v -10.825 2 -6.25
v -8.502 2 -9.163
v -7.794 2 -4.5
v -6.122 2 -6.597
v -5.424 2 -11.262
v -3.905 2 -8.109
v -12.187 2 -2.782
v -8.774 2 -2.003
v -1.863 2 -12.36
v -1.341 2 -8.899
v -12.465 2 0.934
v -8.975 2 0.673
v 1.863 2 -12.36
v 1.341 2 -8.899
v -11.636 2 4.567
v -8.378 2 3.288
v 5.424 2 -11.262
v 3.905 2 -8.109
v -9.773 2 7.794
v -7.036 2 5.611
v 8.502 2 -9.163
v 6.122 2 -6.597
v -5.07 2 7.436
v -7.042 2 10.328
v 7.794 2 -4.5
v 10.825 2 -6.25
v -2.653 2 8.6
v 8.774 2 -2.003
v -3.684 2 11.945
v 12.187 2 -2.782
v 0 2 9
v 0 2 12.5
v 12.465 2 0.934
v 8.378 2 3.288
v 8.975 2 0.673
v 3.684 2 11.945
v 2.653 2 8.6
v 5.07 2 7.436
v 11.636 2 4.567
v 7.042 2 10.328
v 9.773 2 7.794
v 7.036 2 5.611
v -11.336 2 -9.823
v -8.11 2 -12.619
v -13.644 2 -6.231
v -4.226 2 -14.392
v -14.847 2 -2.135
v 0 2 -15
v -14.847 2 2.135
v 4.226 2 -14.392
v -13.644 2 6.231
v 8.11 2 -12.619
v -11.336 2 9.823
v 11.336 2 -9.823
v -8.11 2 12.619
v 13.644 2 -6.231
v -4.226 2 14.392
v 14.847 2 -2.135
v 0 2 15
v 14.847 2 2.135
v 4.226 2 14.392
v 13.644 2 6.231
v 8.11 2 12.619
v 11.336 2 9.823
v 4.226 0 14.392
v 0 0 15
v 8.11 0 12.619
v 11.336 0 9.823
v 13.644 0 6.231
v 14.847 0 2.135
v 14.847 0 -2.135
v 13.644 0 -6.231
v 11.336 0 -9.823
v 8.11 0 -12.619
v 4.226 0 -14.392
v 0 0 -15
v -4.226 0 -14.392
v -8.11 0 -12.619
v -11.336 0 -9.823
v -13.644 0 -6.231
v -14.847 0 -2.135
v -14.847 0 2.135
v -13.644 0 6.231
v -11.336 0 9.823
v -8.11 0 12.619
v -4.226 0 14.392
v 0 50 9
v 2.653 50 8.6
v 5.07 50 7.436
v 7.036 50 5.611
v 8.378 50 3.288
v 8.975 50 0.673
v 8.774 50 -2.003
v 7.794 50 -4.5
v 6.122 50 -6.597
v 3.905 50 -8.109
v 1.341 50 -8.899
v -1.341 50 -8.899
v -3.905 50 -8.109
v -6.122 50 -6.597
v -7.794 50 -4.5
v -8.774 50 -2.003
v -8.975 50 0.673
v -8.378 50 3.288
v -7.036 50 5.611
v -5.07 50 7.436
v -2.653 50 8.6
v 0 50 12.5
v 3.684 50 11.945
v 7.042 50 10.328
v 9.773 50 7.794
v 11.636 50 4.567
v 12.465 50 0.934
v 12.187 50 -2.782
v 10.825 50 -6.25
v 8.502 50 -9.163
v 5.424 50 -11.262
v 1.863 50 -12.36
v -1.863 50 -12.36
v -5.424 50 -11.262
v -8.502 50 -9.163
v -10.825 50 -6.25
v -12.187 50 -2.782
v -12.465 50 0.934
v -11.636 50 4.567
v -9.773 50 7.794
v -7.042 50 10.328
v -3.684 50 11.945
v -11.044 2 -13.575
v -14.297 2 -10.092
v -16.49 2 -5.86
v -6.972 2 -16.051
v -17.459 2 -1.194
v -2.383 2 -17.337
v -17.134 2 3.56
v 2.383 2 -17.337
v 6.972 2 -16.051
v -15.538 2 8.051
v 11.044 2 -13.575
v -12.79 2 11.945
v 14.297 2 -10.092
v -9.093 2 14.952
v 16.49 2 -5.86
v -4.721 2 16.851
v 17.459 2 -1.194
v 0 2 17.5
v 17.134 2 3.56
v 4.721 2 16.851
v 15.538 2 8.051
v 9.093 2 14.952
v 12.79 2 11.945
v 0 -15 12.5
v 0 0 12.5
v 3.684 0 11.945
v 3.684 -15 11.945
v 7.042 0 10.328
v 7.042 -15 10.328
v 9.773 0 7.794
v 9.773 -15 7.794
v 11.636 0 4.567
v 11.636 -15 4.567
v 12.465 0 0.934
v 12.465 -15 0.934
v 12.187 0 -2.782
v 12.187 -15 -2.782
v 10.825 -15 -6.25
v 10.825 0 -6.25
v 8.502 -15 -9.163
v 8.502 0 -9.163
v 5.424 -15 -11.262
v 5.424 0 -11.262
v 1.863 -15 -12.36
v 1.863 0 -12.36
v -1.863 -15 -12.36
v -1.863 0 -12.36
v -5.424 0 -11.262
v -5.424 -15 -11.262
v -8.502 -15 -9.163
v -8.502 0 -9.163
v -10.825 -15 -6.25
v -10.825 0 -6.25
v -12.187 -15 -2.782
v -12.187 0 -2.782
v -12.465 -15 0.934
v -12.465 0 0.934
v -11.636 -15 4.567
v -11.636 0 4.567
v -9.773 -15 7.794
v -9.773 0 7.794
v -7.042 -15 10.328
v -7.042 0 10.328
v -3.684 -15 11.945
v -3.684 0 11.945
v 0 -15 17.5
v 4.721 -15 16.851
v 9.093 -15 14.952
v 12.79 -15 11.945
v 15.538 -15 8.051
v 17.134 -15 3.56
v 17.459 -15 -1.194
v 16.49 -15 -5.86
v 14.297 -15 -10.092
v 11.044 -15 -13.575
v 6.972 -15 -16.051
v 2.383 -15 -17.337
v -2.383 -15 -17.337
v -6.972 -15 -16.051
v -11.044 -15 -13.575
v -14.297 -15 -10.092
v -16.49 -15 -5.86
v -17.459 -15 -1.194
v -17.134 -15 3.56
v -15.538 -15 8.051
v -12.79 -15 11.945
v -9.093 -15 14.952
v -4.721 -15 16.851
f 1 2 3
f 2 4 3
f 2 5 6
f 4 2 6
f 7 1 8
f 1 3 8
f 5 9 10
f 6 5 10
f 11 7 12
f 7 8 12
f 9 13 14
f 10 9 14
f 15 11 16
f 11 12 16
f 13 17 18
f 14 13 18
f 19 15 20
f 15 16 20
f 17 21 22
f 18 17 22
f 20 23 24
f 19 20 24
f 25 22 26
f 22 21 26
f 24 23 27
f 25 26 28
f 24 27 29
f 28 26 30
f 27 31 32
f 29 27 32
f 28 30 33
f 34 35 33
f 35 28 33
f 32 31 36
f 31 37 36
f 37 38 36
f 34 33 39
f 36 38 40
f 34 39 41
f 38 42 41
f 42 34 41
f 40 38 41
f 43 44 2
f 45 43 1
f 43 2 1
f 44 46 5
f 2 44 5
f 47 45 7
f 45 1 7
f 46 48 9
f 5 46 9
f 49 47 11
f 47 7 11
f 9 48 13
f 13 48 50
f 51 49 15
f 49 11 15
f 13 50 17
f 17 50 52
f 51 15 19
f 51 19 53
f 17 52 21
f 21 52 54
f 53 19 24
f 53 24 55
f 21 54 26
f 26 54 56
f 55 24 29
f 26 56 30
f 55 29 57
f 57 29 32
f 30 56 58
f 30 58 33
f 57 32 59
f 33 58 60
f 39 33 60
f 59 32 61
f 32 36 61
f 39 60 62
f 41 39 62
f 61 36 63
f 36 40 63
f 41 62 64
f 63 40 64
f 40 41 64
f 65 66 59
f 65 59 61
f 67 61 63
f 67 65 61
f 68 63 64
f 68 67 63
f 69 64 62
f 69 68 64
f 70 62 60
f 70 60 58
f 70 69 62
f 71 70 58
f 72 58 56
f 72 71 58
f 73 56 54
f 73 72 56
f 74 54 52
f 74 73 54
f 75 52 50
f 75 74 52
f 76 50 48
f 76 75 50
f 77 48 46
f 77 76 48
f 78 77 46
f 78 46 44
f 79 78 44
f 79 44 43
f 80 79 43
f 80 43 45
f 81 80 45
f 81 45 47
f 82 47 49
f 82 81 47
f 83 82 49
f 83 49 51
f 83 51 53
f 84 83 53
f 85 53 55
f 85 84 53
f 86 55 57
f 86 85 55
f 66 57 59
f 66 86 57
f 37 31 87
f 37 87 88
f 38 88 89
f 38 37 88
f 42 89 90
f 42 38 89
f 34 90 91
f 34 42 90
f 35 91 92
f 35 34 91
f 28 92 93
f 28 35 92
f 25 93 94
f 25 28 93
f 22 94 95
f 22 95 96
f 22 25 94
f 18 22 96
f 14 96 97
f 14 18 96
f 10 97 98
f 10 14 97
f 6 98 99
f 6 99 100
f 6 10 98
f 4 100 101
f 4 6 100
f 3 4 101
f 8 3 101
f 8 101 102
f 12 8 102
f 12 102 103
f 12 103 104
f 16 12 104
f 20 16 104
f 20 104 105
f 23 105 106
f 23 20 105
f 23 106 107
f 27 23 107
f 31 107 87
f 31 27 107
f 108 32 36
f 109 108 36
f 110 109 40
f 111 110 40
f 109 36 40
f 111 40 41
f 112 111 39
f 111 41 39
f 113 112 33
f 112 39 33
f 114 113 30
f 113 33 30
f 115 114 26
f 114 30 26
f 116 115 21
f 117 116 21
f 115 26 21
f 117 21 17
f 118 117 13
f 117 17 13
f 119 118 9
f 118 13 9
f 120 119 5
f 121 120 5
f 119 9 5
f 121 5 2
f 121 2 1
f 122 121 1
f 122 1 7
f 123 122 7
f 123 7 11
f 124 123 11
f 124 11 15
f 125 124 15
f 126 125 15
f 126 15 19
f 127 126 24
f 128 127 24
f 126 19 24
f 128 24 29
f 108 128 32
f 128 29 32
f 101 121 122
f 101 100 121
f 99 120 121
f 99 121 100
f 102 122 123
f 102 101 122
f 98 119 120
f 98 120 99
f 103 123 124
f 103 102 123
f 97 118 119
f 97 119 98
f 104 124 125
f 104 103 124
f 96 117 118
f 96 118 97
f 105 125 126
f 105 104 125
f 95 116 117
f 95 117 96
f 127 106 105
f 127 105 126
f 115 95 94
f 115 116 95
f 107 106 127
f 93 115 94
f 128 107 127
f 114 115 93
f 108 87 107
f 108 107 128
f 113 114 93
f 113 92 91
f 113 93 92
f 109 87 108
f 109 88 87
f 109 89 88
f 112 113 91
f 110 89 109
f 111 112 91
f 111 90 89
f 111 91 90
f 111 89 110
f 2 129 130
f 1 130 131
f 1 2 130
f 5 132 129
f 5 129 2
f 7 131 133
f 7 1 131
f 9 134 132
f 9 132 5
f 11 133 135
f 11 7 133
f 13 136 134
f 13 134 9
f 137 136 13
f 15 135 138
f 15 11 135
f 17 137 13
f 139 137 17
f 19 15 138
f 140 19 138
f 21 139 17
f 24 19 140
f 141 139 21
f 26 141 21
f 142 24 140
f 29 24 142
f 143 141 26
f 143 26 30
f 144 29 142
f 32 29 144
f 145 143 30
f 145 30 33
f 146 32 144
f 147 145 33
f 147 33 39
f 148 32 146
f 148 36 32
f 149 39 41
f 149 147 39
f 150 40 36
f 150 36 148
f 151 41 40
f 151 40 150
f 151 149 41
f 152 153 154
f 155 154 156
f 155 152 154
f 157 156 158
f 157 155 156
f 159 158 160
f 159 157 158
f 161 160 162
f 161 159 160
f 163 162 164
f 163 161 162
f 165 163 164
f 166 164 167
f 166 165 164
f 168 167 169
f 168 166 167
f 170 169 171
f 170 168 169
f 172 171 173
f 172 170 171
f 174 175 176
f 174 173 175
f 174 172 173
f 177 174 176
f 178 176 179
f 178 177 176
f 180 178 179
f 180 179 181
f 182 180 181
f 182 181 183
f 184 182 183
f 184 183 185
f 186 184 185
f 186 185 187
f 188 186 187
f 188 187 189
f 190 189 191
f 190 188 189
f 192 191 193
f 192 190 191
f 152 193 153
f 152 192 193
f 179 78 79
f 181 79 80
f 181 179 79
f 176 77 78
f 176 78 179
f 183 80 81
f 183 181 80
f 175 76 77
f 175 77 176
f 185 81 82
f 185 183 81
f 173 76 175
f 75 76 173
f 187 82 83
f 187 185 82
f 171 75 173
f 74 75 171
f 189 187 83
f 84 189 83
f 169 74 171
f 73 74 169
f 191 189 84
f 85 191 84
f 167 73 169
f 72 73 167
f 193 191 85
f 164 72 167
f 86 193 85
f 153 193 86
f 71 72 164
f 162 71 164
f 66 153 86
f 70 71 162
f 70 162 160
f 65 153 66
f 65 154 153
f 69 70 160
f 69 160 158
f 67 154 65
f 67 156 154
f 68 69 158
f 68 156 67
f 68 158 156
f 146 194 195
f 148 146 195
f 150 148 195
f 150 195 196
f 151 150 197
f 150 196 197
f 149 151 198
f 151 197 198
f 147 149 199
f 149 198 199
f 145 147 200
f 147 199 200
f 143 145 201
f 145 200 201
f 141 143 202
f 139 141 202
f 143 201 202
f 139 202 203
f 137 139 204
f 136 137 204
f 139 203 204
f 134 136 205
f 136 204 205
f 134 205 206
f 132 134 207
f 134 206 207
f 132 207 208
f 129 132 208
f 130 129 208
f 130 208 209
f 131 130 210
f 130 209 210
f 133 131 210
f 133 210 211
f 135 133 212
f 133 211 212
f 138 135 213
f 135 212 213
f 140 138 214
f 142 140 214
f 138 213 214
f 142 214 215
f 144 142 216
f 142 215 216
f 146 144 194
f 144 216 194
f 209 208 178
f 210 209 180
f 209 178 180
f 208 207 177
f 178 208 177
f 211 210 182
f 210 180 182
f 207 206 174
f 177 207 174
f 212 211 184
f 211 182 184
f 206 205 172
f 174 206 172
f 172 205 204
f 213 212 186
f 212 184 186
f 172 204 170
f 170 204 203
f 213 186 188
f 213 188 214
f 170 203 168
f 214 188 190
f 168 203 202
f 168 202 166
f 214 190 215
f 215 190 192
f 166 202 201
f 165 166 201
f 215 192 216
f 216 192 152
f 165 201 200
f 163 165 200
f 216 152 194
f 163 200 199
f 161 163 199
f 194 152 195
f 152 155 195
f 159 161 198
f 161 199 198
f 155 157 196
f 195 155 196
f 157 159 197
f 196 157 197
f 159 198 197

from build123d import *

# Parameters (mm, degrees)
BOSS_EXTRUDE4_DEPTH      = 2.0001
BOSS_EXTRUDE4_DEPTH_BACK = 15
SKETCH4_R                = 17.5
SKETCH4_R_2              = 12.5
SKETCH13_R               = 15
CUT_EXTRUDE8_DEPTH       = 2
SKETCH18_R               = 12.5
BOSS_EXTRUDE10_DEPTH     = 48
SKETCH21_R               = 9
CUT_EXTRUDE10_DEPTH      = 48


with BuildPart() as part:
    # Sketch4 → Boss-Extrude4 (new, two sides: drawn at the far end of the back side and taken through both)
    with BuildSketch(Plane(origin=(0, 0, 0), x_dir=(1, 0, 0), z_dir=(0, 1, 0)).offset(-BOSS_EXTRUDE4_DEPTH_BACK)):
        with Locations(Location((0, 0, 0), (0, 0, 270))):
            Circle(SKETCH4_R)
        with Locations(Location((0, 0, 0), (0, 0, 270))):
            Circle(SKETCH4_R_2, mode=Mode.SUBTRACT)
    extrude(amount=BOSS_EXTRUDE4_DEPTH + BOSS_EXTRUDE4_DEPTH_BACK)

    # Sketch13 → Cut-Extrude8 (cut)
    with BuildSketch(Plane(origin=(0, 0, 0), x_dir=(1, 0, 0), z_dir=(0, 1, 0))):
        with Locations(Location((0, 0, 0), (0, 0, 270))):
            Circle(SKETCH13_R)
    extrude(amount=CUT_EXTRUDE8_DEPTH, mode=Mode.SUBTRACT)


with BuildPart() as body_2:
    # Sketch18 → Boss-Extrude10 (new body)
    with BuildSketch(Plane(origin=(0, 2.0001, 0), x_dir=(1, 0, 0), z_dir=(0, 1, 0))):
        with Locations(Location((0, 0, 0), (0, 0, 270))):
            Circle(SKETCH18_R)
    extrude(amount=BOSS_EXTRUDE10_DEPTH)

    # Sketch21 → Cut-Extrude10 (cut)
    with BuildSketch(Plane(origin=(0, 2.0001, 0), x_dir=(1, 0, 0), z_dir=(0, 1, 0))):
        with Locations(Location((0, 0, 0), (0, 0, 270))):
            Circle(SKETCH21_R)
    extrude(amount=CUT_EXTRUDE10_DEPTH, mode=Mode.SUBTRACT)


solid = Compound([part.part, body_2.part])
